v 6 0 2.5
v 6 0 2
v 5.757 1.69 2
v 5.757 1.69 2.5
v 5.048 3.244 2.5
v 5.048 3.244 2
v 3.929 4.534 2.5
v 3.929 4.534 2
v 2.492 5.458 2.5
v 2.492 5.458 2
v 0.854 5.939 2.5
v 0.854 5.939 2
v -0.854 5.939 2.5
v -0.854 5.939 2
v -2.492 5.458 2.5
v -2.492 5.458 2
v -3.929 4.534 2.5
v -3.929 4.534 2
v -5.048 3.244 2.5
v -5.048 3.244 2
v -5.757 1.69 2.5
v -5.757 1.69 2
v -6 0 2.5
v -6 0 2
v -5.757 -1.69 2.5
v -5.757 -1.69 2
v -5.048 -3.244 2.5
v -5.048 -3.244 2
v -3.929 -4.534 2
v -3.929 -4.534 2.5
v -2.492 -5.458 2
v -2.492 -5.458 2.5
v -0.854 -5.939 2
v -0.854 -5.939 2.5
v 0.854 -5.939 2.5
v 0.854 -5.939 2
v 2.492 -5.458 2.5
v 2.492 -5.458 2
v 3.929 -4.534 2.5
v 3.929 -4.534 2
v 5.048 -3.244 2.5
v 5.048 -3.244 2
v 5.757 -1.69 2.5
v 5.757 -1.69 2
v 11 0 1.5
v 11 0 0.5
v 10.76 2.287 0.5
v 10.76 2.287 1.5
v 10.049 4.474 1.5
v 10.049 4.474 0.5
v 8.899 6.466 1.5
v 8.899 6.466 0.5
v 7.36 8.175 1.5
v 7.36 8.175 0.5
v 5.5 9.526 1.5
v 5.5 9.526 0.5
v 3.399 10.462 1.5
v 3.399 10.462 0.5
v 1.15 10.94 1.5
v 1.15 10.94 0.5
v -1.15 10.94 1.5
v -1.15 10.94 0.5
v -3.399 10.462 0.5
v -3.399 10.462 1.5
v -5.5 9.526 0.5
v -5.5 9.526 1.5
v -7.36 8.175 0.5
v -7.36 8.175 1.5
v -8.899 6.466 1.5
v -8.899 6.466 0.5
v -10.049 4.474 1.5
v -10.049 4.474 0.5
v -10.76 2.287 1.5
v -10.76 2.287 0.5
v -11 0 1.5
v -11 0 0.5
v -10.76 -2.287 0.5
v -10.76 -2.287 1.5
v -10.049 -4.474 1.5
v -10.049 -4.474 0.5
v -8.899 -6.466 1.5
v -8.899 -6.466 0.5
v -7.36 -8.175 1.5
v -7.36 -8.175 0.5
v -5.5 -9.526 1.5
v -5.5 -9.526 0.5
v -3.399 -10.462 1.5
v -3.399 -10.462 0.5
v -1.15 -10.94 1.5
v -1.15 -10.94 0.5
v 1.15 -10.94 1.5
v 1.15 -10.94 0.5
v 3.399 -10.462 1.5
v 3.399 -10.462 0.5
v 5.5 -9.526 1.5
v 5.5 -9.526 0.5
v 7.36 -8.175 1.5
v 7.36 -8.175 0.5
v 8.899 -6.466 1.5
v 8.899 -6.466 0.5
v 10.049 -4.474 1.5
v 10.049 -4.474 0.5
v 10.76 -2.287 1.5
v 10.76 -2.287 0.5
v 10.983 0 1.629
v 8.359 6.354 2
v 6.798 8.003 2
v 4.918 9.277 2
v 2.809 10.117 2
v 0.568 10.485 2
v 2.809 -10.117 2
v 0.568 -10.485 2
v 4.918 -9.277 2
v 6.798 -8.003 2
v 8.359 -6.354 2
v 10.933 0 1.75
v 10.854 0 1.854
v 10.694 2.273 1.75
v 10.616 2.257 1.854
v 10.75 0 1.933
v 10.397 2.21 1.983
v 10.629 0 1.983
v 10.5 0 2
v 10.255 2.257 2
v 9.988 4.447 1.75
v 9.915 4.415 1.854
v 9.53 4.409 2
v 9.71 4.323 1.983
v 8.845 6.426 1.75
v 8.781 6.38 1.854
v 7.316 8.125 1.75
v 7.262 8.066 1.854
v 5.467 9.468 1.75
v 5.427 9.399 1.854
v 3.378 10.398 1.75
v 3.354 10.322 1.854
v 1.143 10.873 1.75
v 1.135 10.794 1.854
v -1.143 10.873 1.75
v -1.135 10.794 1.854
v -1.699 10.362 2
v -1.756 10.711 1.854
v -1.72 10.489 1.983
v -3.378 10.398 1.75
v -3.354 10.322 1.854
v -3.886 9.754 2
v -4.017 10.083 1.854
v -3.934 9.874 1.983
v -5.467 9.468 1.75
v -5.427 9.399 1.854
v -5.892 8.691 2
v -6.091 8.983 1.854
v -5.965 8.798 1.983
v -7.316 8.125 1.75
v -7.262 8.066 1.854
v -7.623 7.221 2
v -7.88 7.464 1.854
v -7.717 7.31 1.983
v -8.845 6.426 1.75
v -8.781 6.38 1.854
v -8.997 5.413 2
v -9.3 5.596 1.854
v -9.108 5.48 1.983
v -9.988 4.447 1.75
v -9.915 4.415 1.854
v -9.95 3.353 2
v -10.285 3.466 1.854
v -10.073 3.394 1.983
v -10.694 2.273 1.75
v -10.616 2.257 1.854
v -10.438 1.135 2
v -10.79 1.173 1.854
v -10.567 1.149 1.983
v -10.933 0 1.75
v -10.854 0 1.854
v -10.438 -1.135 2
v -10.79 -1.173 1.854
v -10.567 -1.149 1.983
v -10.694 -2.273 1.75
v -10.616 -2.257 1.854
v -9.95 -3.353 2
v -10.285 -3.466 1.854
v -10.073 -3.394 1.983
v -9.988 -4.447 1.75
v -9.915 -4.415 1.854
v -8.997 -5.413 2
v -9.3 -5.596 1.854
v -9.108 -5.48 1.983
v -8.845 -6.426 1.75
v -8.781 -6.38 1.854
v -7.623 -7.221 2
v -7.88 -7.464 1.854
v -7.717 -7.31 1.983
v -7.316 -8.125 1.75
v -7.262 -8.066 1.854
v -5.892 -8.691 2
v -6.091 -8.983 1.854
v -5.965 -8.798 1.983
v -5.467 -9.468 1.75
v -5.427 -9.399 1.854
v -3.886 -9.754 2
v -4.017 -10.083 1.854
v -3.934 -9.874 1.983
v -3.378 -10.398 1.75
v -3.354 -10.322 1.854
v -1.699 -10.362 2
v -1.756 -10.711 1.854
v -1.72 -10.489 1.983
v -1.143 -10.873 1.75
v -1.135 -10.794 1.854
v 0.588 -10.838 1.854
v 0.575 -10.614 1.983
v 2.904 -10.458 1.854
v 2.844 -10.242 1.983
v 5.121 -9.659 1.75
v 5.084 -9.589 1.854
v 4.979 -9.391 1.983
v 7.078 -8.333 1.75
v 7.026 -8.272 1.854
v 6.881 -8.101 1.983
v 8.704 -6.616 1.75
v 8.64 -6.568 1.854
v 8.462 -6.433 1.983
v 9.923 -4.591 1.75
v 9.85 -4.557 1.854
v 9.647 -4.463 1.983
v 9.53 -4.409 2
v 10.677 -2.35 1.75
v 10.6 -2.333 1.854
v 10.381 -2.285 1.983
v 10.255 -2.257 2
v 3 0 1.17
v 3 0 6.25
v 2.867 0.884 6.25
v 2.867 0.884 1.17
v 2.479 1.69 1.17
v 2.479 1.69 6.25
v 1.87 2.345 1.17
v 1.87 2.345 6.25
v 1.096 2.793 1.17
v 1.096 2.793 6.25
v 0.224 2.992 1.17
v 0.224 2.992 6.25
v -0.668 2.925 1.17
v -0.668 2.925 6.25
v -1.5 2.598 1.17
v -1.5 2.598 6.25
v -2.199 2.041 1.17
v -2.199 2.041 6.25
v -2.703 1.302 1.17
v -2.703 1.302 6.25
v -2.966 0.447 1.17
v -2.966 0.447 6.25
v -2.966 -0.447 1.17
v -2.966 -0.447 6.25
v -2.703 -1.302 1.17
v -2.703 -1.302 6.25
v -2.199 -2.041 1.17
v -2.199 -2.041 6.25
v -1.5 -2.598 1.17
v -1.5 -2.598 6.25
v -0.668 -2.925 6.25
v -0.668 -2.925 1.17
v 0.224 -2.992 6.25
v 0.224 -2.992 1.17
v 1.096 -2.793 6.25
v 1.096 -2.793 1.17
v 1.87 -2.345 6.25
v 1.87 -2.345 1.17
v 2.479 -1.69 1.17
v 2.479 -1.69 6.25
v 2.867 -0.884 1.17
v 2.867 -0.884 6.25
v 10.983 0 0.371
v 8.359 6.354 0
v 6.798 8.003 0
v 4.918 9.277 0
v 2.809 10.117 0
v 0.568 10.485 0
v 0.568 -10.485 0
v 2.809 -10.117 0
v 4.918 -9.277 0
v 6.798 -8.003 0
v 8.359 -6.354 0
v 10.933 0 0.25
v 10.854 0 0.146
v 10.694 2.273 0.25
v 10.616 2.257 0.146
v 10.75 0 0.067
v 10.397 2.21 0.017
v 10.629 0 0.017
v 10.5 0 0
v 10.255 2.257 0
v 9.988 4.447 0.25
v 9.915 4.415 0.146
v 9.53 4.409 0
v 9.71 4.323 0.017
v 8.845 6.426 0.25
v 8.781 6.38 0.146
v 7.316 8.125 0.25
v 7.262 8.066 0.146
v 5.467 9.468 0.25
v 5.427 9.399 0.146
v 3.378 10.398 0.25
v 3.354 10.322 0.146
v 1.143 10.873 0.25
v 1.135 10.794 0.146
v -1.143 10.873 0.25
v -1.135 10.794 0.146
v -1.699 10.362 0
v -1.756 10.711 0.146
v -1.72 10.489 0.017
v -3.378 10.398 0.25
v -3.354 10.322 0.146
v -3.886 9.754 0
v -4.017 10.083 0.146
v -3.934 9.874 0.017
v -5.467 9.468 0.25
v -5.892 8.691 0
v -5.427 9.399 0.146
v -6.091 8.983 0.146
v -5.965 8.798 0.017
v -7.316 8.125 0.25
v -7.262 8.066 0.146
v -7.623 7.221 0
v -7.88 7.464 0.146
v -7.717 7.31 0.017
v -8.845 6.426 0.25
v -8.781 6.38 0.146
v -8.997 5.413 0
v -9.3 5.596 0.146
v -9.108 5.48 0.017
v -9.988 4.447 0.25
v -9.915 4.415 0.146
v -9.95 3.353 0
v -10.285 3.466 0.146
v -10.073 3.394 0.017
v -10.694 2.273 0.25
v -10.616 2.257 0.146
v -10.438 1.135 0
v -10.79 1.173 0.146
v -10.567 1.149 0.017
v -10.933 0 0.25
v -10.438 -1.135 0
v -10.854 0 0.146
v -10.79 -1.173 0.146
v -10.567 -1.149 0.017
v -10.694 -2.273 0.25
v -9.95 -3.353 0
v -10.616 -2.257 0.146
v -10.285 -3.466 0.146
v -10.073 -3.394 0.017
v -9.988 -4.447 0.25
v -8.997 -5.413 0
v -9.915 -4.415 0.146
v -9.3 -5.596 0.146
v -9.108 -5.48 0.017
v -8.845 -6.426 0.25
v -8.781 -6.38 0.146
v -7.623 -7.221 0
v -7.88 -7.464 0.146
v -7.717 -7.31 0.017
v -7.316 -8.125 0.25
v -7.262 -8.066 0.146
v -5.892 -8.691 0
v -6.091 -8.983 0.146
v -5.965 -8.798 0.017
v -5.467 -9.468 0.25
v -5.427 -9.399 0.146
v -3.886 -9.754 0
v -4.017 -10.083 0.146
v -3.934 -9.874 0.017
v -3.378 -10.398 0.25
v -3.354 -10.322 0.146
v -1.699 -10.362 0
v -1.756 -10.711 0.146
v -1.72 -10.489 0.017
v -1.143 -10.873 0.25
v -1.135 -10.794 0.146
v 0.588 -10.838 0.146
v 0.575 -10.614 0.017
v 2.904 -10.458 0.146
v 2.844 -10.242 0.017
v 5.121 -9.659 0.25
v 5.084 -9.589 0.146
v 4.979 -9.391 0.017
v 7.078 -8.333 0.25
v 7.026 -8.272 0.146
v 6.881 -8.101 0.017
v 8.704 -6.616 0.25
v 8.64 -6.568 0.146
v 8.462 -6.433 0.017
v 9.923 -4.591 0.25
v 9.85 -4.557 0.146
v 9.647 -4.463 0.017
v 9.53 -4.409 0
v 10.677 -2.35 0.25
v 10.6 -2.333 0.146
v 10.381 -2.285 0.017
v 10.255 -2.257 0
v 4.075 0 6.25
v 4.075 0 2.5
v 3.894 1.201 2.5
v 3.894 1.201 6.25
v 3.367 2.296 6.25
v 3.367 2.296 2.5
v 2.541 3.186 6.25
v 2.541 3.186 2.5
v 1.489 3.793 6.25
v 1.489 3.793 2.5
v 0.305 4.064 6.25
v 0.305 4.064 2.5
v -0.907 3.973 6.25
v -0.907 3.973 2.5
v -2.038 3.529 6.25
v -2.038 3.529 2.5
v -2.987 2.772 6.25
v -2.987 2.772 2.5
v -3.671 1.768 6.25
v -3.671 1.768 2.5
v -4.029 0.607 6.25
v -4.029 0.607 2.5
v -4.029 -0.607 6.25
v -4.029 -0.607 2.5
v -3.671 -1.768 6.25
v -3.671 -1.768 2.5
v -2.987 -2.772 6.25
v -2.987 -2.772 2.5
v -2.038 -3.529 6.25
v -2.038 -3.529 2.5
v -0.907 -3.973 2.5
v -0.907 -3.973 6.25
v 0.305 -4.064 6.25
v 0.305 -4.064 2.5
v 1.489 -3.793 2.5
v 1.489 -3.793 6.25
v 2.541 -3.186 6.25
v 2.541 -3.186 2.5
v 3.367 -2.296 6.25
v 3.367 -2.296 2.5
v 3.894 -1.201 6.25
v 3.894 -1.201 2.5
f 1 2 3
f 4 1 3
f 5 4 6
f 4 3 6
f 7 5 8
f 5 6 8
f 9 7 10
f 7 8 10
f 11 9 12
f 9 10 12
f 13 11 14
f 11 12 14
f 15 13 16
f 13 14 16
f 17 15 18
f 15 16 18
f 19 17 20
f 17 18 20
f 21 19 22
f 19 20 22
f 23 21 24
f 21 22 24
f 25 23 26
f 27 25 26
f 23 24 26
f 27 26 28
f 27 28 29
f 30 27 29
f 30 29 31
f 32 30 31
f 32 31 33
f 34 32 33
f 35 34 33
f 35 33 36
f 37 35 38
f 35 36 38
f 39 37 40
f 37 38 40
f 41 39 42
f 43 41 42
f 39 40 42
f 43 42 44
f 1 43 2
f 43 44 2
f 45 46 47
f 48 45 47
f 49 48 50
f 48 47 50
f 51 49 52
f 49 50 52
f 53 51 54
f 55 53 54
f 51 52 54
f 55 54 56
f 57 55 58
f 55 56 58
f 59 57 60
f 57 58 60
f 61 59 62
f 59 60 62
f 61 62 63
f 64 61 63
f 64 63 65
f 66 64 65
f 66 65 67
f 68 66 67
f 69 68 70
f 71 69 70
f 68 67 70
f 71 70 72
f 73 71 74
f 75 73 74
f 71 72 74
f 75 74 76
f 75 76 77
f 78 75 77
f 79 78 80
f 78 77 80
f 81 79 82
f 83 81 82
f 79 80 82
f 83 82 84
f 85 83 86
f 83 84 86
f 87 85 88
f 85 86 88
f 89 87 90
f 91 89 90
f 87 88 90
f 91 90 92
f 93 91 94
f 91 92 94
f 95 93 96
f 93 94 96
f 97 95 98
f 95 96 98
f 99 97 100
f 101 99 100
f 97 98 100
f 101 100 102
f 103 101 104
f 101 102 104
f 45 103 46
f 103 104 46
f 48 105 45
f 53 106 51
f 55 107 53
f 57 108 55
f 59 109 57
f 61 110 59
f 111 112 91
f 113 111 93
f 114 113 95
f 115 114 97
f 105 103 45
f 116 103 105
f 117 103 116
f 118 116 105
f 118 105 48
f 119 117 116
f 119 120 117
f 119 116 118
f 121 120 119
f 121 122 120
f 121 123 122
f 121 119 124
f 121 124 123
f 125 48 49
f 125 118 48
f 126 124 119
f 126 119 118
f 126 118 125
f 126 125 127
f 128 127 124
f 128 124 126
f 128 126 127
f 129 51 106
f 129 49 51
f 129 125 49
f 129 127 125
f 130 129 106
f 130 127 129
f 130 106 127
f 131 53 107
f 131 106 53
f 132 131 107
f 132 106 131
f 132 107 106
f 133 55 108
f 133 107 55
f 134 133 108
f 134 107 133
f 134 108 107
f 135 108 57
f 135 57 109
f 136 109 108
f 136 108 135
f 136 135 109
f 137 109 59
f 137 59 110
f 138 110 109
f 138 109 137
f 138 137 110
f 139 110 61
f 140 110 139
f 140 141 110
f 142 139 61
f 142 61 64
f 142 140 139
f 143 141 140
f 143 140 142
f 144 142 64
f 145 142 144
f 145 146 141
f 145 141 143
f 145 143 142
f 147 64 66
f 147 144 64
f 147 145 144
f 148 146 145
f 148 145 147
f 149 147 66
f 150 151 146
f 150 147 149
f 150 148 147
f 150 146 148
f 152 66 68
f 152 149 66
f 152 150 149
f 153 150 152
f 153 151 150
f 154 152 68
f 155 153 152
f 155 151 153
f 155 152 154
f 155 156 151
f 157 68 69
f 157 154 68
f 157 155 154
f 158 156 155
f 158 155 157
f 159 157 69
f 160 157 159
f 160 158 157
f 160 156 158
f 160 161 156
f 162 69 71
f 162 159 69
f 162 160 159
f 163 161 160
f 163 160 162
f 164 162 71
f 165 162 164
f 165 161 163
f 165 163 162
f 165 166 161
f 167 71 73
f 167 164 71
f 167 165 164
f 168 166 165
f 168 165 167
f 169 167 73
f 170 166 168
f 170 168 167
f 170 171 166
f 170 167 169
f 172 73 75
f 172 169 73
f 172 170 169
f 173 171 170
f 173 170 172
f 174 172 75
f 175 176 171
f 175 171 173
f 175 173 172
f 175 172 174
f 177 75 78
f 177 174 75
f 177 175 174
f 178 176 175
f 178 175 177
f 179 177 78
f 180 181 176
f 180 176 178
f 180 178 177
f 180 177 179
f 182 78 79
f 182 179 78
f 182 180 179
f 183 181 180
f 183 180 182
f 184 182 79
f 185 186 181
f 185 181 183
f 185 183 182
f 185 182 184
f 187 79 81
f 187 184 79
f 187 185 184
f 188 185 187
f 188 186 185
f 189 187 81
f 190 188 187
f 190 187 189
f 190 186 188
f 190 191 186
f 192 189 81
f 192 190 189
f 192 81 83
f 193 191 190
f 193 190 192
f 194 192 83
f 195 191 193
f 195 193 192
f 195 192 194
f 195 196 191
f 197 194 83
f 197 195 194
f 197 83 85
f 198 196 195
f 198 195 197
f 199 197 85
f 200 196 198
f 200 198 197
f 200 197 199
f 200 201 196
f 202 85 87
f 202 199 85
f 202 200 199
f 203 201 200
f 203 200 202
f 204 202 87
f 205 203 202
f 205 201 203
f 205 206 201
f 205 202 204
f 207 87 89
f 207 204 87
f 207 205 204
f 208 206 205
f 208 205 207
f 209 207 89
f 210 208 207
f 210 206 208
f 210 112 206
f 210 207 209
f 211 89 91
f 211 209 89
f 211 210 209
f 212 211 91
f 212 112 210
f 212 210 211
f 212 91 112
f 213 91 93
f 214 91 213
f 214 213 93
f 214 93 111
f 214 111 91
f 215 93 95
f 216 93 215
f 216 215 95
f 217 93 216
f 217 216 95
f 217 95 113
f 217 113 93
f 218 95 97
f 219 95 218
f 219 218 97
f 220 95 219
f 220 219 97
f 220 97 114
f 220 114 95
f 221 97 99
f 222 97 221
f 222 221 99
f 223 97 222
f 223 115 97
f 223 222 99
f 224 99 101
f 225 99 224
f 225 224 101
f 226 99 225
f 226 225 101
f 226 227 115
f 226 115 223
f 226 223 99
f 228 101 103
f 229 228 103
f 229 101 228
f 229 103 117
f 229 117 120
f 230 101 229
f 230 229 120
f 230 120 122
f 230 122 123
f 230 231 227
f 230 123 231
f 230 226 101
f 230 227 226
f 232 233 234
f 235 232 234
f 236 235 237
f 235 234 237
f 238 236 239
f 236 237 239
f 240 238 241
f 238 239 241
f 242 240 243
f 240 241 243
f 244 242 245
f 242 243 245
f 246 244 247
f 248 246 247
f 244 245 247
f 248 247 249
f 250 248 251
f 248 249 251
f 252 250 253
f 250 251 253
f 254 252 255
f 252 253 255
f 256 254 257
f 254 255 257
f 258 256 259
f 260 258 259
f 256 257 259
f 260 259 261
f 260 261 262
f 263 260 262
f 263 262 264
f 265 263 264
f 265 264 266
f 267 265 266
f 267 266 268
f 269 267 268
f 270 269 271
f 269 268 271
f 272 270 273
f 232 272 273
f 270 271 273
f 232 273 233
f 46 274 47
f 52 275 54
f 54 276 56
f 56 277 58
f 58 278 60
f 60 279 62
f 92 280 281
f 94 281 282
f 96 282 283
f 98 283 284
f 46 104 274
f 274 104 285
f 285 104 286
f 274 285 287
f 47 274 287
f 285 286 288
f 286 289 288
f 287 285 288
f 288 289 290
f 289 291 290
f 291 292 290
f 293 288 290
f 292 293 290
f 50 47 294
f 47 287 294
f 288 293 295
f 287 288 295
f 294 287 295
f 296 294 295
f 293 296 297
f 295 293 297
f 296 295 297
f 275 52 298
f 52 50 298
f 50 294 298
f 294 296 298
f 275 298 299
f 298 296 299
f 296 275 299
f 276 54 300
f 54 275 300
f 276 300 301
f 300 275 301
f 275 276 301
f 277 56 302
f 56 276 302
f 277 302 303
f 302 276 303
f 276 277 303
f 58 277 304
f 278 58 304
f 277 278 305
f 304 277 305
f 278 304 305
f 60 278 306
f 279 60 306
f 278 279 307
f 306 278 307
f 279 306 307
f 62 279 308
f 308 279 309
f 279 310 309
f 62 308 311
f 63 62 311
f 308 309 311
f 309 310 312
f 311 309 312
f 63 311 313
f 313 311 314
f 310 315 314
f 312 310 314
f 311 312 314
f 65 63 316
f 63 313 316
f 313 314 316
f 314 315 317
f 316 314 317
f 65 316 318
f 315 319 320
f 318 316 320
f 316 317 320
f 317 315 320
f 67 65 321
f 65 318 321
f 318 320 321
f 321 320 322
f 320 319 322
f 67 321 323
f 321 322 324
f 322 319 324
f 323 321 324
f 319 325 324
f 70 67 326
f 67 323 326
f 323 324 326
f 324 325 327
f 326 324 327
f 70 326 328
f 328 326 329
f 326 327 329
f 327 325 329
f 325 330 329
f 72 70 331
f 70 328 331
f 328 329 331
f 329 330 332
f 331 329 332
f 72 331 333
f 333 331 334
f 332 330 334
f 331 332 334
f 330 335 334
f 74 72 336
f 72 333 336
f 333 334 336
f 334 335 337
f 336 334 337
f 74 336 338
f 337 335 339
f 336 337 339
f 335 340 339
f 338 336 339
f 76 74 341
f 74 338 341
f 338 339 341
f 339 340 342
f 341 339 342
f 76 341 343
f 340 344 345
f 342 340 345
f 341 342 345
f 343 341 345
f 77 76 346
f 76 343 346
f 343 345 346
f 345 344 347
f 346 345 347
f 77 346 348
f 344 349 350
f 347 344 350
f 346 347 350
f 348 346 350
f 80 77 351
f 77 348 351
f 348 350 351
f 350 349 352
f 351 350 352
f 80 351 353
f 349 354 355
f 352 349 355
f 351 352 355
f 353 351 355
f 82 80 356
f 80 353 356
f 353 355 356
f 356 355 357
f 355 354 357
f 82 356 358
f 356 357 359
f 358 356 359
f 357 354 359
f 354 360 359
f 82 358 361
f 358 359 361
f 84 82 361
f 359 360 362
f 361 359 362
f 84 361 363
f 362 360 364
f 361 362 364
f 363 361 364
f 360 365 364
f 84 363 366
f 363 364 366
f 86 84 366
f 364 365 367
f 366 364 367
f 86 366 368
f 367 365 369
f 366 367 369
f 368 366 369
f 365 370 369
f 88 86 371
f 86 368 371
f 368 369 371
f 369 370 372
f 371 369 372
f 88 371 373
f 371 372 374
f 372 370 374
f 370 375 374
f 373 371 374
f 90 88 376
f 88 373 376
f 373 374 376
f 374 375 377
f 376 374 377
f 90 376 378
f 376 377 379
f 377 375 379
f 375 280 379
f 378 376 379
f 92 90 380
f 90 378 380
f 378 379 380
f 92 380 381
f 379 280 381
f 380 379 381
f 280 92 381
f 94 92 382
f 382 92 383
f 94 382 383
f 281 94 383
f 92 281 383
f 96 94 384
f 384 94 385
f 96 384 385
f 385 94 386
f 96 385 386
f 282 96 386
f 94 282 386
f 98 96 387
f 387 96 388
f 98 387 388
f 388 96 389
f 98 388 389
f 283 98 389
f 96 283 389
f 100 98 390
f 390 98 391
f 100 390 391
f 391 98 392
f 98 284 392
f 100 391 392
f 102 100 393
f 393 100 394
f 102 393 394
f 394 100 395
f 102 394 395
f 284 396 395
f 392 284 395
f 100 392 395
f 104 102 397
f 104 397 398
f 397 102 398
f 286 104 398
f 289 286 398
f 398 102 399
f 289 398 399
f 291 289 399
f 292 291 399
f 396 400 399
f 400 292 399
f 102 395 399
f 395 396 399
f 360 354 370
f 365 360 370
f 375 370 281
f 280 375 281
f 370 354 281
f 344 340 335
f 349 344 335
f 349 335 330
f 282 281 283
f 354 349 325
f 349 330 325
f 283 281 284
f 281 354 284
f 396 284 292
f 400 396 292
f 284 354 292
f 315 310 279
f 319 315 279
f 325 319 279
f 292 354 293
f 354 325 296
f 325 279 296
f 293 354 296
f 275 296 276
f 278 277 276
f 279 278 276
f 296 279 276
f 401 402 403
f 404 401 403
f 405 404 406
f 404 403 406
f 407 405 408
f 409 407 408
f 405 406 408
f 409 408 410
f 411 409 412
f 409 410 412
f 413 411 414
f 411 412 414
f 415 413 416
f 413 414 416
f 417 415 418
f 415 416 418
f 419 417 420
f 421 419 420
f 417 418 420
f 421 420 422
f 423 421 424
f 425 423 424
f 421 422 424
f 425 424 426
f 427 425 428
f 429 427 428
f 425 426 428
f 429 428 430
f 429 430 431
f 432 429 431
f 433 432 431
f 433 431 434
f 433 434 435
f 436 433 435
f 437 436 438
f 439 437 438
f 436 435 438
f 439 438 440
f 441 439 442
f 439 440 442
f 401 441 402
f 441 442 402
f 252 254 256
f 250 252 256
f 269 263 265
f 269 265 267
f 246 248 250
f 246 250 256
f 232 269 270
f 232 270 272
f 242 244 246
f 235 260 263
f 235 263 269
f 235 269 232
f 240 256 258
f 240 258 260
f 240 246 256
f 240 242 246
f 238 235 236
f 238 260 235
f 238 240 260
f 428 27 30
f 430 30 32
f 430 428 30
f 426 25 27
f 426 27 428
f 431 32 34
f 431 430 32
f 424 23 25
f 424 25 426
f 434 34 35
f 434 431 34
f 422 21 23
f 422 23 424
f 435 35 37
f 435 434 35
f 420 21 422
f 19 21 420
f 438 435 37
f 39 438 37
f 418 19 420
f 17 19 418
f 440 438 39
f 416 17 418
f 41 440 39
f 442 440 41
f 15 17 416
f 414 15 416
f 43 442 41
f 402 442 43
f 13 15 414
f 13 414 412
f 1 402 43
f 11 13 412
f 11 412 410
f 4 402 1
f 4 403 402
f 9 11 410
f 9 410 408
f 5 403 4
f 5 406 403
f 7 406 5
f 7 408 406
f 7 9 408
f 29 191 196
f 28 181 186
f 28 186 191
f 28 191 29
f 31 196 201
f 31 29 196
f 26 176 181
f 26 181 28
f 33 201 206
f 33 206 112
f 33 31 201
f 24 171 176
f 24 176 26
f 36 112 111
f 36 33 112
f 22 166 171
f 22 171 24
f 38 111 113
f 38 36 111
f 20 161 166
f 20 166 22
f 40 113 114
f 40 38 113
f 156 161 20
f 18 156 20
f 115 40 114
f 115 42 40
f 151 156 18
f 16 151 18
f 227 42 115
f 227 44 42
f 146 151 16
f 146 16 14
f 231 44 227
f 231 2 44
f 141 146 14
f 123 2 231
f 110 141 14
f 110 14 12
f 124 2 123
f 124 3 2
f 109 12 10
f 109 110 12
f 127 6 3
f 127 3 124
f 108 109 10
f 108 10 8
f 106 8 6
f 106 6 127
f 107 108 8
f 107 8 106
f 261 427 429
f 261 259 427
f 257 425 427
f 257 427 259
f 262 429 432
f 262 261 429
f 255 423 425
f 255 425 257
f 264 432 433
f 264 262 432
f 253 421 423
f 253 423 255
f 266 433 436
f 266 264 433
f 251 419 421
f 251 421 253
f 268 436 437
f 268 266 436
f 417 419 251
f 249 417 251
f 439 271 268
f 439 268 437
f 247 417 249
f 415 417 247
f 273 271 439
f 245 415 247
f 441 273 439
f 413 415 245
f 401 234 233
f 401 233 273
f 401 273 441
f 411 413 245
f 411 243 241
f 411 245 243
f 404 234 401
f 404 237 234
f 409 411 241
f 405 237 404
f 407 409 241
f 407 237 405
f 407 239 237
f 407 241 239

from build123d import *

# Parameters (mm, degrees)
F0_R     = 11
F1_DEPTH = 2
F2_R     = 6
F3_DEPTH = 0.5
F4_R     = 4.075
F5_DEPTH = 3.75
F6_R     = 3
F7_DEPTH = 5.08
F8_R     = 0.5


with BuildPart() as f1:
    # F0 (on Top) → F1 (new body)
    with BuildSketch(Plane.XY):
        Circle(F0_R)
    extrude(amount=F1_DEPTH)

    # F2 (on face) → F3 (join)
    with BuildSketch(Plane.XY.offset(2)):
        Circle(F2_R)
    extrude(amount=F3_DEPTH)

    # F4 (on face) → F5 (join)
    with BuildSketch(Plane.XY.offset(2.5)):
        Circle(F4_R)
    extrude(amount=F5_DEPTH)

    # F6 (on face) → F7 (cut)
    with BuildSketch(Plane.XY.offset(6.25)):
        Circle(F6_R)
    extrude(amount=-F7_DEPTH, mode=Mode.SUBTRACT)

    # F8
    f8_edges = [f1.edges().sort_by_distance(p)[0] for p in [
        (-11, 0, 2),
        (-11, 0, 0),
    ]]
    fillet(f8_edges, radius=F8_R)


solid = f1.part
